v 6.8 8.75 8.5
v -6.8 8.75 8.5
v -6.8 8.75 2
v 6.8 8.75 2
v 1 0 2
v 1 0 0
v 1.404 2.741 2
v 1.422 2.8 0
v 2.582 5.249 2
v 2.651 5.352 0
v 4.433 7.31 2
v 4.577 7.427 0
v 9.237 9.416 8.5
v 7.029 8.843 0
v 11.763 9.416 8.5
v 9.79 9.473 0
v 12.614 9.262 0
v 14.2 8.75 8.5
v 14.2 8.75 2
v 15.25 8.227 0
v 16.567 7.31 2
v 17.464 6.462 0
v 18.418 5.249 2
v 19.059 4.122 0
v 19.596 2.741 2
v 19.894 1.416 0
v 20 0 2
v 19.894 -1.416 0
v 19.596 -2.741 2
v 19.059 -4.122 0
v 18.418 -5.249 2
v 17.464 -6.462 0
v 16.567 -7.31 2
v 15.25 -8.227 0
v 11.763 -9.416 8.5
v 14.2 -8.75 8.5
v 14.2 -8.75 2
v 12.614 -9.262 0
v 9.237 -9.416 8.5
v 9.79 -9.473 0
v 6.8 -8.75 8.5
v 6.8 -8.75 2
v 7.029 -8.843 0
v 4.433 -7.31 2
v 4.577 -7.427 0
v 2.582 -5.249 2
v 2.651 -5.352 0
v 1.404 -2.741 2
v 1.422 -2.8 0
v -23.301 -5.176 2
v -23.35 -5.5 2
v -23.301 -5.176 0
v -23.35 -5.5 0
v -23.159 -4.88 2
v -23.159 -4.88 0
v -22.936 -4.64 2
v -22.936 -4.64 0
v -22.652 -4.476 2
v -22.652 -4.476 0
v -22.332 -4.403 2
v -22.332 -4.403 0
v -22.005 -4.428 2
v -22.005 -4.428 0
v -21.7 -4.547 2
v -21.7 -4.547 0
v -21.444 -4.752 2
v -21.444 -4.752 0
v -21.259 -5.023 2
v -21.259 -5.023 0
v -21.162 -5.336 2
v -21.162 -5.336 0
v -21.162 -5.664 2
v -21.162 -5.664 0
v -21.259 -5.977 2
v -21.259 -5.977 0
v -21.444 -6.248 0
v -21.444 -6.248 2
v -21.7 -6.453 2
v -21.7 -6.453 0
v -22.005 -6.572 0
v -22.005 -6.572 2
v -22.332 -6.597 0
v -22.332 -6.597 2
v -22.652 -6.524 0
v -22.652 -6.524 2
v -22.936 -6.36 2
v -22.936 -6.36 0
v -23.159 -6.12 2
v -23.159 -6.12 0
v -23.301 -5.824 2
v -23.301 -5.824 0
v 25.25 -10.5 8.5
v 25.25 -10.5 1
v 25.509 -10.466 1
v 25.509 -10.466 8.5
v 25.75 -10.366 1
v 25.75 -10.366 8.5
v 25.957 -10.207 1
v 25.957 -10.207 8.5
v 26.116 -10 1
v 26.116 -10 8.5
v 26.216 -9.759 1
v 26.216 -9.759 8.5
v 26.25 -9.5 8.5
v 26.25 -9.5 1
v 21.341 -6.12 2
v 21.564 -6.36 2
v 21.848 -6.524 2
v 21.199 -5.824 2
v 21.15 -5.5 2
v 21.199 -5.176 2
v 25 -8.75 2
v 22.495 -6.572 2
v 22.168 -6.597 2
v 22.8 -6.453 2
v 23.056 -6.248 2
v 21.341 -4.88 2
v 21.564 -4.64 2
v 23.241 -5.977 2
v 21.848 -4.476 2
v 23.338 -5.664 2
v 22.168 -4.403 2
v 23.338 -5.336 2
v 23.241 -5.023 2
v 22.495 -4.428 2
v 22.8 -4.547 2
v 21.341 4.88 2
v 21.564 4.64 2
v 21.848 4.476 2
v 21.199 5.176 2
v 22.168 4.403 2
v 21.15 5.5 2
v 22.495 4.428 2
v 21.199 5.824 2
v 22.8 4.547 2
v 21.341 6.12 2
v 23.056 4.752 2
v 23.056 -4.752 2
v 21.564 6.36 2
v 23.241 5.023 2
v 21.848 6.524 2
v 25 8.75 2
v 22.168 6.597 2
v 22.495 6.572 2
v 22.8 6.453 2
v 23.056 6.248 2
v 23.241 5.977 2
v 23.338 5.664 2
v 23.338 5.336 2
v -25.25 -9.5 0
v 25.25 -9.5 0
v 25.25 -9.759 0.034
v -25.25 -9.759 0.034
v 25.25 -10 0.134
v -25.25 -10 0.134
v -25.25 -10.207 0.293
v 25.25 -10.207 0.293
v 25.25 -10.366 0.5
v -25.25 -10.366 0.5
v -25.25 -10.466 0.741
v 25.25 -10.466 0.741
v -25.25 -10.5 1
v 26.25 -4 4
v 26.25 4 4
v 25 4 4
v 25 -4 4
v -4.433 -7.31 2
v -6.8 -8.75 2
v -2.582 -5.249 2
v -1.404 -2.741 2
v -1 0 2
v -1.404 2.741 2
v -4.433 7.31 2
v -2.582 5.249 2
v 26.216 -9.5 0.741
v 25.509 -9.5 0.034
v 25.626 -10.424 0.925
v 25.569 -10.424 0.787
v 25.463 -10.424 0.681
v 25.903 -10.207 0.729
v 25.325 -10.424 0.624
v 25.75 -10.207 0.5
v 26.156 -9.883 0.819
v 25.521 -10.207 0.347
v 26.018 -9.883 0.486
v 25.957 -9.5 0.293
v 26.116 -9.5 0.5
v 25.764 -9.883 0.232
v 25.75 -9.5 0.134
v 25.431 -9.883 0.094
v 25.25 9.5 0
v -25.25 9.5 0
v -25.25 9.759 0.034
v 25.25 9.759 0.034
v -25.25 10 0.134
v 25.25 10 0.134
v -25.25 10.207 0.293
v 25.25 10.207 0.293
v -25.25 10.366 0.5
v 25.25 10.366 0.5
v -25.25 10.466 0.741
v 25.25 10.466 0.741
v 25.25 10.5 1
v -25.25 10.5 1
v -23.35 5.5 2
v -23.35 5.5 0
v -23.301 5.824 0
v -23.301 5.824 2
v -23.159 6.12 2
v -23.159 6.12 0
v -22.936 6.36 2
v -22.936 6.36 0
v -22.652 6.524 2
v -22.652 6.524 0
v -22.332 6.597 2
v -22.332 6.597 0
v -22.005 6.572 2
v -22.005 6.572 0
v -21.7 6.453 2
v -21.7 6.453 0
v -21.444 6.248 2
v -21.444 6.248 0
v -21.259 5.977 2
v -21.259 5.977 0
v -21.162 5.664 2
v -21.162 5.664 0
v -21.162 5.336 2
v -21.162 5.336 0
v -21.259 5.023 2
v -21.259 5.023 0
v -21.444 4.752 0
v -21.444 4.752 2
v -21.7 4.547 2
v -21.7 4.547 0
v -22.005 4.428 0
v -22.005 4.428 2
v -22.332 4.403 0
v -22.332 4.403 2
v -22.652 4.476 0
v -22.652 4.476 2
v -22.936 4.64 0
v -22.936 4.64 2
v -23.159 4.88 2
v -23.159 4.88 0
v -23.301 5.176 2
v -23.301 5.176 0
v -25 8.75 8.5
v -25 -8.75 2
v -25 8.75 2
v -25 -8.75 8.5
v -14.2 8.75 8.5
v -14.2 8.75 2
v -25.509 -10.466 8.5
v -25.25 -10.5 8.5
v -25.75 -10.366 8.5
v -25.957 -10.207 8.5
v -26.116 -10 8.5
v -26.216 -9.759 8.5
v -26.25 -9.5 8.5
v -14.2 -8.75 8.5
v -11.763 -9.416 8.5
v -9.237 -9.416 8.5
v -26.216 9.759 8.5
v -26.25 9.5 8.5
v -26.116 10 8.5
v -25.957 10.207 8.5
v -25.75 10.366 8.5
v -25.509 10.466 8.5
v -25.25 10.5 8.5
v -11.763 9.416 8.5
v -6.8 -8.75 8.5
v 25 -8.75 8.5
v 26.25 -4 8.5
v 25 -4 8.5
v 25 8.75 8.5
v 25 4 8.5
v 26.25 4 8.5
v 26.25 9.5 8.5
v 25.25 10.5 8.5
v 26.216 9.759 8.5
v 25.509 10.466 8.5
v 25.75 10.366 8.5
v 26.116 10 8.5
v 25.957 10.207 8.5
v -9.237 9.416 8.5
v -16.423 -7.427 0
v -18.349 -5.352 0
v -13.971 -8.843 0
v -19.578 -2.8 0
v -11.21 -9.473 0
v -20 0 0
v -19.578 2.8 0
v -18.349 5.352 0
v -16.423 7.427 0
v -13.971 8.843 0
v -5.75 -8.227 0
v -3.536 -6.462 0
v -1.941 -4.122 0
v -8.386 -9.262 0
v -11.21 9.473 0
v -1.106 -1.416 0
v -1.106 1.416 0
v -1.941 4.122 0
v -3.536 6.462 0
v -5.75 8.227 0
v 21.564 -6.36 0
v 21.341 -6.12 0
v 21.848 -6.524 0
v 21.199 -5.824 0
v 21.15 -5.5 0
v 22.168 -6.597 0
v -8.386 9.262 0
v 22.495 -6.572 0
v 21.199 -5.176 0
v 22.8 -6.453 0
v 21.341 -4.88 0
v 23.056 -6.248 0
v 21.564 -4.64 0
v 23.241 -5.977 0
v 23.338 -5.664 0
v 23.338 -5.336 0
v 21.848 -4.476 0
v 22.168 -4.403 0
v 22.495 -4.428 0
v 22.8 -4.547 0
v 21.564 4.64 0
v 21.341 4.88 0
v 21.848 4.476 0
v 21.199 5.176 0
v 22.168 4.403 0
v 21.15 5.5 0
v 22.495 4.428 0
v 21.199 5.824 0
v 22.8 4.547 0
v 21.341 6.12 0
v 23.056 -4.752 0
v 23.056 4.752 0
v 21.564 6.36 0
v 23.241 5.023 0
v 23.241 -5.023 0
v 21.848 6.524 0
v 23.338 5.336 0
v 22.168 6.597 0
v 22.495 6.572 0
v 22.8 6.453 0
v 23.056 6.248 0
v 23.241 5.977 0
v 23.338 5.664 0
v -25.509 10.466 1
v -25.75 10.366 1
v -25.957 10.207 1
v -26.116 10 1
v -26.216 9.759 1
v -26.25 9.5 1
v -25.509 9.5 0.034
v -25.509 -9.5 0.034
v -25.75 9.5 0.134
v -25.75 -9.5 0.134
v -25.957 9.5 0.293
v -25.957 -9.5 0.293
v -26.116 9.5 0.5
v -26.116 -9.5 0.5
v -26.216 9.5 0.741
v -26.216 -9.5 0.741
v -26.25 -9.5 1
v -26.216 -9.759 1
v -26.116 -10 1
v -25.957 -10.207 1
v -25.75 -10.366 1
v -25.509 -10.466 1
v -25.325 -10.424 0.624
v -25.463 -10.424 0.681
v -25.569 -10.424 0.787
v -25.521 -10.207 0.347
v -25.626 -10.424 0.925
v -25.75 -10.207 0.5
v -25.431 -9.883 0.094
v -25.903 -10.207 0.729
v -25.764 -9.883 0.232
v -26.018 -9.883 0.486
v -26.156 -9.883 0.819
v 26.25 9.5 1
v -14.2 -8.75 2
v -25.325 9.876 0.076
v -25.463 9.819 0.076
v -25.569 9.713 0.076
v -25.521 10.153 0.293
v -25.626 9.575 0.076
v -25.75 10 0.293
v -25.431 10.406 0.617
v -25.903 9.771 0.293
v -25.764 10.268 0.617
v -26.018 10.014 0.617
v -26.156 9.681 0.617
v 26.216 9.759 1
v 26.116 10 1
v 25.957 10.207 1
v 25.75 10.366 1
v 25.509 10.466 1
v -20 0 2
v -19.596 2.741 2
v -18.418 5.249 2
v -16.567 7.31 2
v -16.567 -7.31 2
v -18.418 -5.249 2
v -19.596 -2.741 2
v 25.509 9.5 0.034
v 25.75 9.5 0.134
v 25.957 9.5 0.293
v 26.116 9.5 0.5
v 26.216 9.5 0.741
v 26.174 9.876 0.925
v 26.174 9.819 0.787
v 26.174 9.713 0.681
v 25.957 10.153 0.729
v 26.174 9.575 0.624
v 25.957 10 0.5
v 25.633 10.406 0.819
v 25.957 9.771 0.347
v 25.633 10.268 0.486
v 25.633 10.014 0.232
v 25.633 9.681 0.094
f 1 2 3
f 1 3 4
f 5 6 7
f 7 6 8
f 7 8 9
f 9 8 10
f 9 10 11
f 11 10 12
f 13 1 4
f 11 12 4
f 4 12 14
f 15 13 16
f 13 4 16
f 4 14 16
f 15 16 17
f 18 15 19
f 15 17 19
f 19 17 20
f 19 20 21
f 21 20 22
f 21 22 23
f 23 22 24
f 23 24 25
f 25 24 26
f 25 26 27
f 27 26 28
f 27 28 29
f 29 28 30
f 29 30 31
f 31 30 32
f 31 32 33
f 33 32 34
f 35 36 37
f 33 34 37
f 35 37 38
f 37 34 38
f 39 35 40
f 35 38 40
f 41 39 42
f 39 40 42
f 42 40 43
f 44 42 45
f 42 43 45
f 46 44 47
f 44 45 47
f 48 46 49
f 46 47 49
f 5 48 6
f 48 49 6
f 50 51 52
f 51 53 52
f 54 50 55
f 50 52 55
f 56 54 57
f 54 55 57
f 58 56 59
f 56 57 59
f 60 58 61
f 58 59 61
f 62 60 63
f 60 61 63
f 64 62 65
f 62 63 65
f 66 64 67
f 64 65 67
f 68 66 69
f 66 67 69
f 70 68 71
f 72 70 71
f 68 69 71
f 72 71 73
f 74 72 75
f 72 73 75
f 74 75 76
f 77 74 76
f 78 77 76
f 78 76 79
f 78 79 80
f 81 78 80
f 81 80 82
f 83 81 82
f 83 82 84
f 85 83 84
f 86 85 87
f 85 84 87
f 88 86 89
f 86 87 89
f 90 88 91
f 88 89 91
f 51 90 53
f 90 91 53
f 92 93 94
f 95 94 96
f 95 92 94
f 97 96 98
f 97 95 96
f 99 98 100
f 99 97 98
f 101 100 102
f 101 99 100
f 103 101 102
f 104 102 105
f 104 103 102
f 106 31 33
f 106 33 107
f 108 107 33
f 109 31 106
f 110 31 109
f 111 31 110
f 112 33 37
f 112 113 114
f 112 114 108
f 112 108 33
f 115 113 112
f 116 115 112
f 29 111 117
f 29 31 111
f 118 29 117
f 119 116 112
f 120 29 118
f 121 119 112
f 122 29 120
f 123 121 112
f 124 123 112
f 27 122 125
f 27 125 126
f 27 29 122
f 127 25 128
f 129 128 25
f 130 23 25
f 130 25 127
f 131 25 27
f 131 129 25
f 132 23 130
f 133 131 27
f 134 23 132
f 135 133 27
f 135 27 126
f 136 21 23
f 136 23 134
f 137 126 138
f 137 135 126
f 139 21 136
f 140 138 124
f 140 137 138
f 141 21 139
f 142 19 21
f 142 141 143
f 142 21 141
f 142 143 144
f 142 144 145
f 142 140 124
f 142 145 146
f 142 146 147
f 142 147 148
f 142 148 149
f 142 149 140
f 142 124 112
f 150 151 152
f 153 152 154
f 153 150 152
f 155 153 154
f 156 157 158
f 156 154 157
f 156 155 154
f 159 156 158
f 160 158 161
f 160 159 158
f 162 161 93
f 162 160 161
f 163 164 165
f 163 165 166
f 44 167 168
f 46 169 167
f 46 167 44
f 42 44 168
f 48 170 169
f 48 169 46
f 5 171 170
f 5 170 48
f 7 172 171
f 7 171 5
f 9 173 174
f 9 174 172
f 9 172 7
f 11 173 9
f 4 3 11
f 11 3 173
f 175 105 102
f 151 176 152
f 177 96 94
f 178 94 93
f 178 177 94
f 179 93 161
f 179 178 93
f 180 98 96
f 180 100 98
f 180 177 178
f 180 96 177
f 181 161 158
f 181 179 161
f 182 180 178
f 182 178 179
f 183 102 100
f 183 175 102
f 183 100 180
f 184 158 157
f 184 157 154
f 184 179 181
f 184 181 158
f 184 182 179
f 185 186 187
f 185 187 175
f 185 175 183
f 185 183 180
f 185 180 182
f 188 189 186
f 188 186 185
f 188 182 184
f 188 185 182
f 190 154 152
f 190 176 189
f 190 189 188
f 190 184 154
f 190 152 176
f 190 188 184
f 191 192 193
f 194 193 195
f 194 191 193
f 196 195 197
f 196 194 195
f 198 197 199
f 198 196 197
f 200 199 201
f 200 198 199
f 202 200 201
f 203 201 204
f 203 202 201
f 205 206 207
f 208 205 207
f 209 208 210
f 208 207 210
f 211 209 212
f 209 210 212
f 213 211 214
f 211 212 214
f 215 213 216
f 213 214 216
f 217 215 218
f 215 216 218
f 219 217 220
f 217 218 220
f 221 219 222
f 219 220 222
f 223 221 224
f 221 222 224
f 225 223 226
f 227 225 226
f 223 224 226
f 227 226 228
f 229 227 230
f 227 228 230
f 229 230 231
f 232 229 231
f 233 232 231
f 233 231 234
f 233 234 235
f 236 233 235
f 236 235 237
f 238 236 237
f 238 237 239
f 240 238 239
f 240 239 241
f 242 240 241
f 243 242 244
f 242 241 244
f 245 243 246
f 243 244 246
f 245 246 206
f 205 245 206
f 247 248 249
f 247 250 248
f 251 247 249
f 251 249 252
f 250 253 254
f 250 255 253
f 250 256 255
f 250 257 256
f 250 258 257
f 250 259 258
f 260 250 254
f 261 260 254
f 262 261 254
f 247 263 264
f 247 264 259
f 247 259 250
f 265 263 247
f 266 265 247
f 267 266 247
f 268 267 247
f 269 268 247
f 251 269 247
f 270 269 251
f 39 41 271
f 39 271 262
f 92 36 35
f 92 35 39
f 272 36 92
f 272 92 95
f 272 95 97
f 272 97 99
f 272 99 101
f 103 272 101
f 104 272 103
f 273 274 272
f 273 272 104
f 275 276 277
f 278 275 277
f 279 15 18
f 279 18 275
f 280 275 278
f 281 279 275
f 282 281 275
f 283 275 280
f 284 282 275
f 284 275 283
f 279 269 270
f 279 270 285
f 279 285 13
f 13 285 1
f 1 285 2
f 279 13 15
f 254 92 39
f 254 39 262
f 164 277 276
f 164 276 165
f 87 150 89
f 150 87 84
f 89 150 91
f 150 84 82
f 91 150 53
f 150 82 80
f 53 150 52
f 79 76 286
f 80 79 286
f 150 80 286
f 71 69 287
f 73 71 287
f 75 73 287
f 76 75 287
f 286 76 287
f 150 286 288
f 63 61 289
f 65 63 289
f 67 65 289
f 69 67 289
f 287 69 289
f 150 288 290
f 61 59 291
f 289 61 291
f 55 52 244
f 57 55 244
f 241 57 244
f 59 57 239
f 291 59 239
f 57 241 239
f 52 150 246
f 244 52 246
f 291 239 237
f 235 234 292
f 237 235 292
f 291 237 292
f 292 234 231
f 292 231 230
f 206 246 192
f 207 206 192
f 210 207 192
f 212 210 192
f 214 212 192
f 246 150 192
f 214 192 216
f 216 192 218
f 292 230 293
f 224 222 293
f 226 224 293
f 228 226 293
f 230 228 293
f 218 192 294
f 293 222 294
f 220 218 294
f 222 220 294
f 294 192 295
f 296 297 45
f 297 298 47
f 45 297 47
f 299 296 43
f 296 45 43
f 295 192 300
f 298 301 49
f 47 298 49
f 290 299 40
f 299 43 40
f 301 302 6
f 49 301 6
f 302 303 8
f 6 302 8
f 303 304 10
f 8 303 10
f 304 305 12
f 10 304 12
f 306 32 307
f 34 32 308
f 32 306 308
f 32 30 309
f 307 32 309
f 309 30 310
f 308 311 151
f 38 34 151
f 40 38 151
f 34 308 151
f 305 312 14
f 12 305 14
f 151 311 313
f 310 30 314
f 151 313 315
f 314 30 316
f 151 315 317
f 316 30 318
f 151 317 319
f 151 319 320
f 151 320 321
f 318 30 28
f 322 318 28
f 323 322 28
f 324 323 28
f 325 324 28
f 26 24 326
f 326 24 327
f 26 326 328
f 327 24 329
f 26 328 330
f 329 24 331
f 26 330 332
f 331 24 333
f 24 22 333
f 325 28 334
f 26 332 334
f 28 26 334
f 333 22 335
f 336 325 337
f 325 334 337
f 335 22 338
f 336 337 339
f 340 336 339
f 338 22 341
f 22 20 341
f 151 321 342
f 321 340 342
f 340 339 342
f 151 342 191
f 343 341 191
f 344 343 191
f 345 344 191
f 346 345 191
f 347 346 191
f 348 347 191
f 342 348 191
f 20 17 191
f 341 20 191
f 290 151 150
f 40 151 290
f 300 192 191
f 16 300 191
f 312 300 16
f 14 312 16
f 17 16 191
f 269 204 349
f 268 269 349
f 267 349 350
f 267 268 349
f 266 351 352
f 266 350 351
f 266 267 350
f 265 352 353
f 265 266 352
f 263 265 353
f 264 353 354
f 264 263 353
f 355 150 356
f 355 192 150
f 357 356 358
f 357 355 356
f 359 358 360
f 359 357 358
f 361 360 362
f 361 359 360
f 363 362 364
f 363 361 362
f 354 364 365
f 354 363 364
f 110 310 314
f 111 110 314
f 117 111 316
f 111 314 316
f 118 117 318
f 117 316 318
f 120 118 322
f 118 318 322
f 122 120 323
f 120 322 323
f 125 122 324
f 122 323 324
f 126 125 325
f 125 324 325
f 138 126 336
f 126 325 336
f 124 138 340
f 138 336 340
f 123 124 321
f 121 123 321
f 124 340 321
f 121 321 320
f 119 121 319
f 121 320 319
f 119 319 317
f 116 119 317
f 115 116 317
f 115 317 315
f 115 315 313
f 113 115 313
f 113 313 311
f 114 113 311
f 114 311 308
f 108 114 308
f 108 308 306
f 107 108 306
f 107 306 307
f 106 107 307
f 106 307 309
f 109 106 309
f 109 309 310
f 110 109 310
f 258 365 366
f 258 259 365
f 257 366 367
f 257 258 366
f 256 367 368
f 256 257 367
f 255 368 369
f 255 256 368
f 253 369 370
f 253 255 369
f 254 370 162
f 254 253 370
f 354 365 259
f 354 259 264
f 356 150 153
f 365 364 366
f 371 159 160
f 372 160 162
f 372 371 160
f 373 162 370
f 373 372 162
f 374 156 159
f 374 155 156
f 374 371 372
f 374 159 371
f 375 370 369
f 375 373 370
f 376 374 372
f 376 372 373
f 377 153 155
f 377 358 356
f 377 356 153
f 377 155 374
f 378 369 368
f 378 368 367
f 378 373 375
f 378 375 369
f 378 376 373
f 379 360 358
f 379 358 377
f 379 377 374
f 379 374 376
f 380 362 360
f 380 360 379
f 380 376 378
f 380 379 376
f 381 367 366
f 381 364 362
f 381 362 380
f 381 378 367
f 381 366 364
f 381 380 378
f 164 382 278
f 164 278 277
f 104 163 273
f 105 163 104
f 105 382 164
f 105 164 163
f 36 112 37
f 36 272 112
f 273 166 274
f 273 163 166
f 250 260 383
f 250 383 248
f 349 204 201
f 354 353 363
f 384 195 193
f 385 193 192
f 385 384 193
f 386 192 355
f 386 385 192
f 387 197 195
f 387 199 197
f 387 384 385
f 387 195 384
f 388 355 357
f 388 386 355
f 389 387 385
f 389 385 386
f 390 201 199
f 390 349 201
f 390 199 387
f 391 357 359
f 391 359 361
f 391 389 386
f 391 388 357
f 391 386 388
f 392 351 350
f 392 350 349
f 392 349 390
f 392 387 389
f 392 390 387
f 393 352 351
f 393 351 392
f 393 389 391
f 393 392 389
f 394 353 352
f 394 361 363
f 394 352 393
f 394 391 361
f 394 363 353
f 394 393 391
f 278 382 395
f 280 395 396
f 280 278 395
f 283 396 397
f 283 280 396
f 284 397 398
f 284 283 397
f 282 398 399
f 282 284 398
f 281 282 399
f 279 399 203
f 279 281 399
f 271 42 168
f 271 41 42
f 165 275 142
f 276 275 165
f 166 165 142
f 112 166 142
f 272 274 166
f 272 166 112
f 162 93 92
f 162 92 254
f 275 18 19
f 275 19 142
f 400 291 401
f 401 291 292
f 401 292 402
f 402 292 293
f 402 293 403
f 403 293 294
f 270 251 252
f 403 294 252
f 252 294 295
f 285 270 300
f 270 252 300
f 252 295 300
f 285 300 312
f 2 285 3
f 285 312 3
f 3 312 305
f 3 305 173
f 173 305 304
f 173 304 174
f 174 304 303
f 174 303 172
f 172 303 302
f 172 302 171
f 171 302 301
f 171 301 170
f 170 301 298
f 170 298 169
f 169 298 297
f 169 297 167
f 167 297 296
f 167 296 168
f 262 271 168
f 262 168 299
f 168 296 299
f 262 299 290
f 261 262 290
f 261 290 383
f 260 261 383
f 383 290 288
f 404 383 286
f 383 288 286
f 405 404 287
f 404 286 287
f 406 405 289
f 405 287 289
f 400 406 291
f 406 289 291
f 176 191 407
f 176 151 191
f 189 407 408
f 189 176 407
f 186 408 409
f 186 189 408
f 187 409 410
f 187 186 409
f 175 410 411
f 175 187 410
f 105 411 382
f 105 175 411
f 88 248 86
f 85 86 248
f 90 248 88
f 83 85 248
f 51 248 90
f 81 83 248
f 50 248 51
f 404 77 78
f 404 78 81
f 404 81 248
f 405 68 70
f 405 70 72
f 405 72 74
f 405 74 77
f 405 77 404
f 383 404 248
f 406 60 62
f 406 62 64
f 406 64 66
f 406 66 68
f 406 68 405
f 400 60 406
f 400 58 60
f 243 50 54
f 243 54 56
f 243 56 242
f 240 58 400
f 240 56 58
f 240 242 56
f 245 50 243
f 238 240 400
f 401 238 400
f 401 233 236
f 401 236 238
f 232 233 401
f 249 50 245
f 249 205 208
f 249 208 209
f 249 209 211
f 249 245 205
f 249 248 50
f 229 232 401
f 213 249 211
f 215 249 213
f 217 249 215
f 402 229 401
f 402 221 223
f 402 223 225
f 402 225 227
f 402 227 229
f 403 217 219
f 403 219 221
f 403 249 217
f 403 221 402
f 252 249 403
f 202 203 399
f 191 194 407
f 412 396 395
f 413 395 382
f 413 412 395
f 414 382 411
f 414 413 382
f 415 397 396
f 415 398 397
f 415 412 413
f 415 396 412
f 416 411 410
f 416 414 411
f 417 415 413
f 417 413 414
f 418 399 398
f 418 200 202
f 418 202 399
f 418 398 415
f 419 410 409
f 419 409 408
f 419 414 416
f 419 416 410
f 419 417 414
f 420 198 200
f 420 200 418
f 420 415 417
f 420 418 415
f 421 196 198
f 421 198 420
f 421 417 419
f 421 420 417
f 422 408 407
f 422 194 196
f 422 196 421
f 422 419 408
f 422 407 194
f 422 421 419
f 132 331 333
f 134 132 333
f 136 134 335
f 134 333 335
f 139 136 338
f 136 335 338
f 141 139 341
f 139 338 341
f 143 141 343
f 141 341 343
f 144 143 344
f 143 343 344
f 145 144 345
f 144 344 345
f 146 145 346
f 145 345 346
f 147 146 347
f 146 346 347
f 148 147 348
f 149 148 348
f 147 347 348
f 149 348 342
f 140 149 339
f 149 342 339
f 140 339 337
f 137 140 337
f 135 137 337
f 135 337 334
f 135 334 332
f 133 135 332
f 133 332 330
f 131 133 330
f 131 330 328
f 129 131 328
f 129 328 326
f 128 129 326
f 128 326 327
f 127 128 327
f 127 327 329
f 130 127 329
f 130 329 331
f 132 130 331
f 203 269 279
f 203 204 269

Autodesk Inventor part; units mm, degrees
ref_plane "YZ Plane" through (0, 0, 0) normal (1, 0, 0) x (0, 1, 0)
ref_plane "XZ Plane" through (0, 0, 0) normal (0, 1, 0) x (-1, 0, 0)
ref_plane "XY Plane" through (0, 0, 0) normal (0, 0, 1) x (1, 0, 0)
sketch "スケッチ1" plane through (0, 0, 0) normal (0, 0, 1) x (1, 0, 0)
  line L0 (26.25, -10.5) -> (-26.25, -10.5)
  line L1 (-26.25, -10.5) -> (-26.25, 10.5)
  line L2 (-26.25, 10.5) -> (26.25, 10.5)
  line L3 (26.25, 10.5) -> (26.25, -10.5)
  line L4 (26.25, -10.5) -> (-26.25, 10.5) construction
  line L5 (-26.25, -10.5) -> (26.25, 10.5) construction
  point P0 (0, 0)
  dimension "d0" = 52.5
  dimension "d2" = 21
extrude "押し出し1" add sketch "スケッチ1" along normal blind 8.5
sketch "スケッチ19" plane through (0, 0, 0) normal (0, 0, -1) x (-1, 0, 0)
  circle A0 centre (-22.25, 5.5) radius 1.1
  circle A1 centre (22.25, 5.5) radius 1.1
  circle A2 centre (22.25, -5.5) radius 1.1
  circle A3 centre (-22.25, -5.5) radius 1.1
  point P0 (0, 0)
  dimension "d140" = 2.2
  dimension "d141" = 2.2
  dimension "d142" = 2.2
  dimension "d143" = 2.2
  dimension "d144" = 44.5
  dimension "d145" = 22.25
  dimension "d146" = 11
  dimension "d147" = 5.5
  dimension "d148" = 44.5
  dimension "d149" = 11
extrude "押し出し15" cut sketch "スケッチ19" against normal through all
sketch "スケッチ20" plane through (0, 0, 8.5) normal (0, 0, 1) x (1, 0, 0)
  line L0 (25, -8.75) -> (-25, -8.75)
  line L1 (-25, -8.75) -> (-25, 8.75)
  line L2 (-25, 8.75) -> (25, 8.75)
  line L3 (25, 8.75) -> (25, -8.75)
  point P0 (0, 0)
  dimension "d152" = 50
  dimension "d153" = 25
  dimension "d154" = 17.5
  dimension "d155" = 8.75
extrude "押し出し16" cut sketch "スケッチ20" against normal blind 6.5
sketch "スケッチ21" plane through (26.25, -10.5, 0) normal (1, 0, 0) x (0, 0, -1)
  line L0 (-8.5, 0) -> (-8.5, 21) projected
  line L1 (-8.5, 14.5) -> (-4, 14.5)
  line L2 (-4, 14.5) -> (-4, 6.5)
  line L3 (-4, 6.5) -> (-8.5, 6.5)
  line L4 (-8.5, 6.5) -> (-8.5, 14.5)
  line L5 (0, 21) -> (-8.5, 21) projected
  line L6 (0, 0) -> (-8.5, 0) projected
  line L7 (0, 21) -> (0, 0) projected
  point P0 (0, 10.5)
  dimension "d160" = 4
  dimension "d163" = 6.5
  dimension "d164" = 6.5
extrude "押し出し17" cut sketch "スケッチ21" against normal blind 7 contours L0 L1 L2 L3
sketch "スケッチ22" plane through (0, 0, 0) normal (0, 0, -1) x (-1, 0, 0)
  circle A0 centre (10.5, 0) radius 9.5
  circle A1 centre (-10.5, 0) radius 9.5
  point P0 (0, 0)
  dimension "d165" = 19
  dimension "d166" = 19
  dimension "d167" = 10.5
  dimension "d168" = 10.5
extrude "押し出し18" cut sketch "スケッチ22" against normal through all
fillet "フィレット3" radius 1 8 edges at (-26.25, 10.5, 4.25) (-26.25, 0, 0) (-26.25, -10.5, 4.25) (0, 10.5, 0) (26.25, 10.5, 4.25) (26.25, 0, 0) (0, -10.5, 0) (26.25, -10.5, 4.25)
properties part number "New_Accelite_Controller_Cover_copy" material "ABS プラスチック"
